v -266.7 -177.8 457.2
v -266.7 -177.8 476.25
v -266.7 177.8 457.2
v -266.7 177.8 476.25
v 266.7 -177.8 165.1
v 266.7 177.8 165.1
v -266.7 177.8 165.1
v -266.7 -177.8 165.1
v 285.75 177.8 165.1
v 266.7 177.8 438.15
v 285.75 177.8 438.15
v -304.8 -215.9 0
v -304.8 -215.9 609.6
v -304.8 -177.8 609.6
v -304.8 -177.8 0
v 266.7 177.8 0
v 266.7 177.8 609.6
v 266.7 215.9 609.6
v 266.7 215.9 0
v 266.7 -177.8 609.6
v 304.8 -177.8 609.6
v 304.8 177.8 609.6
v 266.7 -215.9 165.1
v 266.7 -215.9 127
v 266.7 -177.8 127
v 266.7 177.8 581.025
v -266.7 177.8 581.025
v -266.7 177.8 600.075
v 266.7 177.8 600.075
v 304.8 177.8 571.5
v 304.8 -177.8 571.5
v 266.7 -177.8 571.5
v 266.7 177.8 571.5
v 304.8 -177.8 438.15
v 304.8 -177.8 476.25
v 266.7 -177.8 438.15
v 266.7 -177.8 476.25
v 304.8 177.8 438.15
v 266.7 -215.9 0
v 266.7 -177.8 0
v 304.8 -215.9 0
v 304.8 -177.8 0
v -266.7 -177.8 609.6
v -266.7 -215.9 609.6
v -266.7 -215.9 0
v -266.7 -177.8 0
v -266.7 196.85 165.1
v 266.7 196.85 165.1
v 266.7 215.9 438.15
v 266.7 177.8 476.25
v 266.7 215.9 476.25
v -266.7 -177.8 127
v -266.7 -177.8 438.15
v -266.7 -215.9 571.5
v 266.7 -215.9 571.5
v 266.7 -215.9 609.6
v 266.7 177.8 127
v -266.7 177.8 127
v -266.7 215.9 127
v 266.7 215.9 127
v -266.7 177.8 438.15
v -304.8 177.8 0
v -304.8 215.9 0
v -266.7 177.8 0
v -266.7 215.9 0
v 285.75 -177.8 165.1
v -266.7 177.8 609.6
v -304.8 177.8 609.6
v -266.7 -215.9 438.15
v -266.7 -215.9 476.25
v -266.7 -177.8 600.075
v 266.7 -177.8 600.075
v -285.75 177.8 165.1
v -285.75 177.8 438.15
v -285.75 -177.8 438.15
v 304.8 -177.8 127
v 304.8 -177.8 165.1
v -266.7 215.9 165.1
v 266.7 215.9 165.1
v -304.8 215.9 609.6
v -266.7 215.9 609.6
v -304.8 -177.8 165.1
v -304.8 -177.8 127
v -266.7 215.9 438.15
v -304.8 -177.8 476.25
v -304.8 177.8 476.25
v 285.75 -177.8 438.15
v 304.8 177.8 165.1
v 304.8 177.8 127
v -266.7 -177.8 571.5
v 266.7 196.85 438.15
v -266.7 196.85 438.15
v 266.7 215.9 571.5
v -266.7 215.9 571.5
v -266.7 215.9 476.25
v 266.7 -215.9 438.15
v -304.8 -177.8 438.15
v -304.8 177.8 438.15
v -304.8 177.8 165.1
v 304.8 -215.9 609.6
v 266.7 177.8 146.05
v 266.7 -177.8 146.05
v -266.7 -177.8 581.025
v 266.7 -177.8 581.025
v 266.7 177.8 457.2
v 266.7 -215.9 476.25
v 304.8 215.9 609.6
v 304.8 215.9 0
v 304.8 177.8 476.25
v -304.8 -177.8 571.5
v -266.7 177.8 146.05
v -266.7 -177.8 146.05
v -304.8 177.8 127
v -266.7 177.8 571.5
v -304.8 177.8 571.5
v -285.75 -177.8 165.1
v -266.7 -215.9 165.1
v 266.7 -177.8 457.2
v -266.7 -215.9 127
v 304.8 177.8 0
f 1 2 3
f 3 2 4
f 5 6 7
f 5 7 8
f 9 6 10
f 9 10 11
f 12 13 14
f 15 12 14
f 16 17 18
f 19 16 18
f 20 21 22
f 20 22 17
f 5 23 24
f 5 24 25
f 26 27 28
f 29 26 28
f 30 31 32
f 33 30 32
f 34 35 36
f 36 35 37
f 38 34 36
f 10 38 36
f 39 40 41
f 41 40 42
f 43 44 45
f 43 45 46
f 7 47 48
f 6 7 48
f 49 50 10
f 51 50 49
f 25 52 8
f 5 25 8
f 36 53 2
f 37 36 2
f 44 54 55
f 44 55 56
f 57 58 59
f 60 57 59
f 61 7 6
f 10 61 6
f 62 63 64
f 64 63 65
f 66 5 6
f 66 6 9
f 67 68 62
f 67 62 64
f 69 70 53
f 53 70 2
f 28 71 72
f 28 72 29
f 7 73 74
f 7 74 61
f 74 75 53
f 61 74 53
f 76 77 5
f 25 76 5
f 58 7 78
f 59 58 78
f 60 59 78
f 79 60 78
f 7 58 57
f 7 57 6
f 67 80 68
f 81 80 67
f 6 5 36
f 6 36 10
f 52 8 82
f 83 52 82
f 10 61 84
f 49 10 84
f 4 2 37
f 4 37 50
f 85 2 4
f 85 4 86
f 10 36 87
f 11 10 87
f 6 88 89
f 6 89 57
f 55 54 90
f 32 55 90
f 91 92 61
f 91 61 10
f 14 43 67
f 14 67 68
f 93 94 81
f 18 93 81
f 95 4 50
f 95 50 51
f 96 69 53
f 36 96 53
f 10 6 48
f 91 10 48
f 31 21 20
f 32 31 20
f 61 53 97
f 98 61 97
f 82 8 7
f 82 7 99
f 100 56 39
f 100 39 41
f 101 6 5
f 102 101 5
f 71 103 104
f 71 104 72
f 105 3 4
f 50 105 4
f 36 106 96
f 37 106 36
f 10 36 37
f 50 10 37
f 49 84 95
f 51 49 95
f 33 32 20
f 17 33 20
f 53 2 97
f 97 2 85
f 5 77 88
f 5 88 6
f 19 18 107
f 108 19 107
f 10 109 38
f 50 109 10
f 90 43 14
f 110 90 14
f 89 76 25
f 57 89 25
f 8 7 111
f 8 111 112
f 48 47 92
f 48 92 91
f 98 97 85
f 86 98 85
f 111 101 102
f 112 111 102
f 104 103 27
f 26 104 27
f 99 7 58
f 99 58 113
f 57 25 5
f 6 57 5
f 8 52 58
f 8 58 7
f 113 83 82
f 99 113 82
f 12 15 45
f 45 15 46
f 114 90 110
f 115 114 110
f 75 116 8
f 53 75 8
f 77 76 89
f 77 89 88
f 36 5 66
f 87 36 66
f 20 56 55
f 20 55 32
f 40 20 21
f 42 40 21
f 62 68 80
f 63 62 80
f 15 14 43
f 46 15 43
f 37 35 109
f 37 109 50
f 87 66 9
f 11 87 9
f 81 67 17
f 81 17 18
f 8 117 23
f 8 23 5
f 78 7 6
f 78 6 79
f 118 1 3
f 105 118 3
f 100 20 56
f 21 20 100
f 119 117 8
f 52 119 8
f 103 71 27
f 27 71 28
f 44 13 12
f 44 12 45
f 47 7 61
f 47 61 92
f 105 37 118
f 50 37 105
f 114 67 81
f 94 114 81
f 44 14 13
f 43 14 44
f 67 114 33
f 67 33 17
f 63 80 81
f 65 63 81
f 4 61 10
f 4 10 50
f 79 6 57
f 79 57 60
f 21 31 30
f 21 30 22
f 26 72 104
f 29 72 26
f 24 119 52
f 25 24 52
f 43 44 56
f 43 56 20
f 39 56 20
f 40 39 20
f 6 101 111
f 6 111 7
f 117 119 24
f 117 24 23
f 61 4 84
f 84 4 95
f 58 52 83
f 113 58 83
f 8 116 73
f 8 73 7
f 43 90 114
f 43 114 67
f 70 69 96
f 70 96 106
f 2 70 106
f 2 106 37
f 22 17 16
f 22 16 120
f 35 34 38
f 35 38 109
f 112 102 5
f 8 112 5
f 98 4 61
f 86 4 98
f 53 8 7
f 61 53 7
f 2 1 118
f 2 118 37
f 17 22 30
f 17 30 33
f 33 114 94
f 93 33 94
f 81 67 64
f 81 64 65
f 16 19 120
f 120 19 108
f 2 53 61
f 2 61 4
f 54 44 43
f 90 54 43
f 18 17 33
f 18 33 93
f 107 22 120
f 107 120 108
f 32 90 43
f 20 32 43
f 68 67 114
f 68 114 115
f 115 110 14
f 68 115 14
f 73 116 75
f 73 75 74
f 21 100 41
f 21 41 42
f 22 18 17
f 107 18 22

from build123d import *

# Parameters (mm, degrees)
F0_W      = 38.1
F0_H      = 38.1
F1_DEPTH  = 609.6
F2_W      = 38.1
F2_H      = 38.1
F3_DEPTH  = 533.4
F4_W      = 38.1
F4_H      = 38.1
F5_DEPTH  = 355.6
F6_W      = 355.6
F6_H      = 19.05
F7_DEPTH  = 533.4
F8_W      = 19.05
F8_H      = 355.6
F8_W_2    = 533.4
F8_H_2    = 19.05
F9_DEPTH  = 273.05
F10_W     = 355.6
F10_H     = 19.05
F11_DEPTH = 533.4
F12_W     = 355.6
F12_H     = 19.05
F13_DEPTH = 533.4


with BuildPart() as f1:
    # F0 (on Top) → F1 (new body)
    with BuildSketch(Plane.XY):
        with Locations((-285.75, -196.85)):
            Rectangle(F0_W, F0_H)
        with Locations((-285.75, 196.85)):
            Rectangle(F0_W, F0_H)
        with Locations((285.75, 196.85)):
            Rectangle(F0_W, F0_H)
        with Locations((285.75, -196.85)):
            Rectangle(F0_W, F0_H)
    extrude(amount=F1_DEPTH)


with BuildPart() as f3:
    # F2 (on face) → F3 (new body, through all)
    with BuildSketch(Plane.YZ.offset(-266.7)):
        with Locations((-196.85, 146.05)):
            Rectangle(F2_W, F2_H)
        with Locations((196.85, 146.05)):
            Rectangle(F2_W, F2_H)
        with Locations((-196.85, 590.55)):
            Rectangle(F2_W, F2_H)
        with Locations((-196.85, 457.2)):
            Rectangle(F2_W, F2_H)
        with Locations((196.85, 457.2)):
            Rectangle(F2_W, F2_H)
        with Locations((196.85, 590.55)):
            Rectangle(F2_W, F2_H)
    extrude(amount=F3_DEPTH)


with BuildPart() as f5:
    # F4 (on face) → F5 (new body, through all)
    with BuildSketch(Plane(origin=(0, -177.8, 0), x_dir=(-1, 0, 0), z_dir=(0, 1, 0))):
        with Locations((-285.75, 590.55)):
            Rectangle(F4_W, F4_H)
        with Locations((-285.75, 457.2)):
            Rectangle(F4_W, F4_H)
        with Locations((-285.75, 146.05)):
            Rectangle(F4_W, F4_H)
        with Locations((285.75, 146.05)):
            Rectangle(F4_W, F4_H)
        with Locations((285.75, 457.2)):
            Rectangle(F4_W, F4_H)
        with Locations((285.75, 590.55)):
            Rectangle(F4_W, F4_H)
    extrude(amount=F5_DEPTH)


with BuildPart() as f7:
    # F6 (on face) → F7 (new body, through all)
    with BuildSketch(Plane(origin=(266.7, 0, 0), x_dir=(0, -1, 0), z_dir=(-1, 0, 0))):
        with Locations((0, 155.575)):
            Rectangle(F6_W, F6_H)
    extrude(amount=F7_DEPTH)


with BuildPart() as f9:
    # F8 (on face) → F9 (new body, through all)
    with BuildSketch(Plane.XY.offset(165.1)):
        with Locations((276.225, 0)):
            Rectangle(F8_W, F8_H)
        with Locations((0, 187.325)):
            Rectangle(F8_W_2, F8_H_2)
        with Locations((-276.225, 0)):
            Rectangle(F8_W, F8_H)
    extrude(amount=F9_DEPTH)


with BuildPart() as f11:
    # F10 (on face) → F11 (new body, through all)
    with BuildSketch(Plane.YZ.offset(-266.7)):
        with Locations((0, 466.725)):
            Rectangle(F10_W, F10_H)
    extrude(amount=F11_DEPTH)


with BuildPart() as f13:
    # F12 (on face) → F13 (new body, through all)
    with BuildSketch(Plane.YZ.offset(-266.7)):
        with Locations((0, 590.55)):
            Rectangle(F12_W, F12_H)
    extrude(amount=F13_DEPTH)


solid = Compound([f1.part, f3.part, f5.part, f7.part, f9.part, f11.part, f13.part])
